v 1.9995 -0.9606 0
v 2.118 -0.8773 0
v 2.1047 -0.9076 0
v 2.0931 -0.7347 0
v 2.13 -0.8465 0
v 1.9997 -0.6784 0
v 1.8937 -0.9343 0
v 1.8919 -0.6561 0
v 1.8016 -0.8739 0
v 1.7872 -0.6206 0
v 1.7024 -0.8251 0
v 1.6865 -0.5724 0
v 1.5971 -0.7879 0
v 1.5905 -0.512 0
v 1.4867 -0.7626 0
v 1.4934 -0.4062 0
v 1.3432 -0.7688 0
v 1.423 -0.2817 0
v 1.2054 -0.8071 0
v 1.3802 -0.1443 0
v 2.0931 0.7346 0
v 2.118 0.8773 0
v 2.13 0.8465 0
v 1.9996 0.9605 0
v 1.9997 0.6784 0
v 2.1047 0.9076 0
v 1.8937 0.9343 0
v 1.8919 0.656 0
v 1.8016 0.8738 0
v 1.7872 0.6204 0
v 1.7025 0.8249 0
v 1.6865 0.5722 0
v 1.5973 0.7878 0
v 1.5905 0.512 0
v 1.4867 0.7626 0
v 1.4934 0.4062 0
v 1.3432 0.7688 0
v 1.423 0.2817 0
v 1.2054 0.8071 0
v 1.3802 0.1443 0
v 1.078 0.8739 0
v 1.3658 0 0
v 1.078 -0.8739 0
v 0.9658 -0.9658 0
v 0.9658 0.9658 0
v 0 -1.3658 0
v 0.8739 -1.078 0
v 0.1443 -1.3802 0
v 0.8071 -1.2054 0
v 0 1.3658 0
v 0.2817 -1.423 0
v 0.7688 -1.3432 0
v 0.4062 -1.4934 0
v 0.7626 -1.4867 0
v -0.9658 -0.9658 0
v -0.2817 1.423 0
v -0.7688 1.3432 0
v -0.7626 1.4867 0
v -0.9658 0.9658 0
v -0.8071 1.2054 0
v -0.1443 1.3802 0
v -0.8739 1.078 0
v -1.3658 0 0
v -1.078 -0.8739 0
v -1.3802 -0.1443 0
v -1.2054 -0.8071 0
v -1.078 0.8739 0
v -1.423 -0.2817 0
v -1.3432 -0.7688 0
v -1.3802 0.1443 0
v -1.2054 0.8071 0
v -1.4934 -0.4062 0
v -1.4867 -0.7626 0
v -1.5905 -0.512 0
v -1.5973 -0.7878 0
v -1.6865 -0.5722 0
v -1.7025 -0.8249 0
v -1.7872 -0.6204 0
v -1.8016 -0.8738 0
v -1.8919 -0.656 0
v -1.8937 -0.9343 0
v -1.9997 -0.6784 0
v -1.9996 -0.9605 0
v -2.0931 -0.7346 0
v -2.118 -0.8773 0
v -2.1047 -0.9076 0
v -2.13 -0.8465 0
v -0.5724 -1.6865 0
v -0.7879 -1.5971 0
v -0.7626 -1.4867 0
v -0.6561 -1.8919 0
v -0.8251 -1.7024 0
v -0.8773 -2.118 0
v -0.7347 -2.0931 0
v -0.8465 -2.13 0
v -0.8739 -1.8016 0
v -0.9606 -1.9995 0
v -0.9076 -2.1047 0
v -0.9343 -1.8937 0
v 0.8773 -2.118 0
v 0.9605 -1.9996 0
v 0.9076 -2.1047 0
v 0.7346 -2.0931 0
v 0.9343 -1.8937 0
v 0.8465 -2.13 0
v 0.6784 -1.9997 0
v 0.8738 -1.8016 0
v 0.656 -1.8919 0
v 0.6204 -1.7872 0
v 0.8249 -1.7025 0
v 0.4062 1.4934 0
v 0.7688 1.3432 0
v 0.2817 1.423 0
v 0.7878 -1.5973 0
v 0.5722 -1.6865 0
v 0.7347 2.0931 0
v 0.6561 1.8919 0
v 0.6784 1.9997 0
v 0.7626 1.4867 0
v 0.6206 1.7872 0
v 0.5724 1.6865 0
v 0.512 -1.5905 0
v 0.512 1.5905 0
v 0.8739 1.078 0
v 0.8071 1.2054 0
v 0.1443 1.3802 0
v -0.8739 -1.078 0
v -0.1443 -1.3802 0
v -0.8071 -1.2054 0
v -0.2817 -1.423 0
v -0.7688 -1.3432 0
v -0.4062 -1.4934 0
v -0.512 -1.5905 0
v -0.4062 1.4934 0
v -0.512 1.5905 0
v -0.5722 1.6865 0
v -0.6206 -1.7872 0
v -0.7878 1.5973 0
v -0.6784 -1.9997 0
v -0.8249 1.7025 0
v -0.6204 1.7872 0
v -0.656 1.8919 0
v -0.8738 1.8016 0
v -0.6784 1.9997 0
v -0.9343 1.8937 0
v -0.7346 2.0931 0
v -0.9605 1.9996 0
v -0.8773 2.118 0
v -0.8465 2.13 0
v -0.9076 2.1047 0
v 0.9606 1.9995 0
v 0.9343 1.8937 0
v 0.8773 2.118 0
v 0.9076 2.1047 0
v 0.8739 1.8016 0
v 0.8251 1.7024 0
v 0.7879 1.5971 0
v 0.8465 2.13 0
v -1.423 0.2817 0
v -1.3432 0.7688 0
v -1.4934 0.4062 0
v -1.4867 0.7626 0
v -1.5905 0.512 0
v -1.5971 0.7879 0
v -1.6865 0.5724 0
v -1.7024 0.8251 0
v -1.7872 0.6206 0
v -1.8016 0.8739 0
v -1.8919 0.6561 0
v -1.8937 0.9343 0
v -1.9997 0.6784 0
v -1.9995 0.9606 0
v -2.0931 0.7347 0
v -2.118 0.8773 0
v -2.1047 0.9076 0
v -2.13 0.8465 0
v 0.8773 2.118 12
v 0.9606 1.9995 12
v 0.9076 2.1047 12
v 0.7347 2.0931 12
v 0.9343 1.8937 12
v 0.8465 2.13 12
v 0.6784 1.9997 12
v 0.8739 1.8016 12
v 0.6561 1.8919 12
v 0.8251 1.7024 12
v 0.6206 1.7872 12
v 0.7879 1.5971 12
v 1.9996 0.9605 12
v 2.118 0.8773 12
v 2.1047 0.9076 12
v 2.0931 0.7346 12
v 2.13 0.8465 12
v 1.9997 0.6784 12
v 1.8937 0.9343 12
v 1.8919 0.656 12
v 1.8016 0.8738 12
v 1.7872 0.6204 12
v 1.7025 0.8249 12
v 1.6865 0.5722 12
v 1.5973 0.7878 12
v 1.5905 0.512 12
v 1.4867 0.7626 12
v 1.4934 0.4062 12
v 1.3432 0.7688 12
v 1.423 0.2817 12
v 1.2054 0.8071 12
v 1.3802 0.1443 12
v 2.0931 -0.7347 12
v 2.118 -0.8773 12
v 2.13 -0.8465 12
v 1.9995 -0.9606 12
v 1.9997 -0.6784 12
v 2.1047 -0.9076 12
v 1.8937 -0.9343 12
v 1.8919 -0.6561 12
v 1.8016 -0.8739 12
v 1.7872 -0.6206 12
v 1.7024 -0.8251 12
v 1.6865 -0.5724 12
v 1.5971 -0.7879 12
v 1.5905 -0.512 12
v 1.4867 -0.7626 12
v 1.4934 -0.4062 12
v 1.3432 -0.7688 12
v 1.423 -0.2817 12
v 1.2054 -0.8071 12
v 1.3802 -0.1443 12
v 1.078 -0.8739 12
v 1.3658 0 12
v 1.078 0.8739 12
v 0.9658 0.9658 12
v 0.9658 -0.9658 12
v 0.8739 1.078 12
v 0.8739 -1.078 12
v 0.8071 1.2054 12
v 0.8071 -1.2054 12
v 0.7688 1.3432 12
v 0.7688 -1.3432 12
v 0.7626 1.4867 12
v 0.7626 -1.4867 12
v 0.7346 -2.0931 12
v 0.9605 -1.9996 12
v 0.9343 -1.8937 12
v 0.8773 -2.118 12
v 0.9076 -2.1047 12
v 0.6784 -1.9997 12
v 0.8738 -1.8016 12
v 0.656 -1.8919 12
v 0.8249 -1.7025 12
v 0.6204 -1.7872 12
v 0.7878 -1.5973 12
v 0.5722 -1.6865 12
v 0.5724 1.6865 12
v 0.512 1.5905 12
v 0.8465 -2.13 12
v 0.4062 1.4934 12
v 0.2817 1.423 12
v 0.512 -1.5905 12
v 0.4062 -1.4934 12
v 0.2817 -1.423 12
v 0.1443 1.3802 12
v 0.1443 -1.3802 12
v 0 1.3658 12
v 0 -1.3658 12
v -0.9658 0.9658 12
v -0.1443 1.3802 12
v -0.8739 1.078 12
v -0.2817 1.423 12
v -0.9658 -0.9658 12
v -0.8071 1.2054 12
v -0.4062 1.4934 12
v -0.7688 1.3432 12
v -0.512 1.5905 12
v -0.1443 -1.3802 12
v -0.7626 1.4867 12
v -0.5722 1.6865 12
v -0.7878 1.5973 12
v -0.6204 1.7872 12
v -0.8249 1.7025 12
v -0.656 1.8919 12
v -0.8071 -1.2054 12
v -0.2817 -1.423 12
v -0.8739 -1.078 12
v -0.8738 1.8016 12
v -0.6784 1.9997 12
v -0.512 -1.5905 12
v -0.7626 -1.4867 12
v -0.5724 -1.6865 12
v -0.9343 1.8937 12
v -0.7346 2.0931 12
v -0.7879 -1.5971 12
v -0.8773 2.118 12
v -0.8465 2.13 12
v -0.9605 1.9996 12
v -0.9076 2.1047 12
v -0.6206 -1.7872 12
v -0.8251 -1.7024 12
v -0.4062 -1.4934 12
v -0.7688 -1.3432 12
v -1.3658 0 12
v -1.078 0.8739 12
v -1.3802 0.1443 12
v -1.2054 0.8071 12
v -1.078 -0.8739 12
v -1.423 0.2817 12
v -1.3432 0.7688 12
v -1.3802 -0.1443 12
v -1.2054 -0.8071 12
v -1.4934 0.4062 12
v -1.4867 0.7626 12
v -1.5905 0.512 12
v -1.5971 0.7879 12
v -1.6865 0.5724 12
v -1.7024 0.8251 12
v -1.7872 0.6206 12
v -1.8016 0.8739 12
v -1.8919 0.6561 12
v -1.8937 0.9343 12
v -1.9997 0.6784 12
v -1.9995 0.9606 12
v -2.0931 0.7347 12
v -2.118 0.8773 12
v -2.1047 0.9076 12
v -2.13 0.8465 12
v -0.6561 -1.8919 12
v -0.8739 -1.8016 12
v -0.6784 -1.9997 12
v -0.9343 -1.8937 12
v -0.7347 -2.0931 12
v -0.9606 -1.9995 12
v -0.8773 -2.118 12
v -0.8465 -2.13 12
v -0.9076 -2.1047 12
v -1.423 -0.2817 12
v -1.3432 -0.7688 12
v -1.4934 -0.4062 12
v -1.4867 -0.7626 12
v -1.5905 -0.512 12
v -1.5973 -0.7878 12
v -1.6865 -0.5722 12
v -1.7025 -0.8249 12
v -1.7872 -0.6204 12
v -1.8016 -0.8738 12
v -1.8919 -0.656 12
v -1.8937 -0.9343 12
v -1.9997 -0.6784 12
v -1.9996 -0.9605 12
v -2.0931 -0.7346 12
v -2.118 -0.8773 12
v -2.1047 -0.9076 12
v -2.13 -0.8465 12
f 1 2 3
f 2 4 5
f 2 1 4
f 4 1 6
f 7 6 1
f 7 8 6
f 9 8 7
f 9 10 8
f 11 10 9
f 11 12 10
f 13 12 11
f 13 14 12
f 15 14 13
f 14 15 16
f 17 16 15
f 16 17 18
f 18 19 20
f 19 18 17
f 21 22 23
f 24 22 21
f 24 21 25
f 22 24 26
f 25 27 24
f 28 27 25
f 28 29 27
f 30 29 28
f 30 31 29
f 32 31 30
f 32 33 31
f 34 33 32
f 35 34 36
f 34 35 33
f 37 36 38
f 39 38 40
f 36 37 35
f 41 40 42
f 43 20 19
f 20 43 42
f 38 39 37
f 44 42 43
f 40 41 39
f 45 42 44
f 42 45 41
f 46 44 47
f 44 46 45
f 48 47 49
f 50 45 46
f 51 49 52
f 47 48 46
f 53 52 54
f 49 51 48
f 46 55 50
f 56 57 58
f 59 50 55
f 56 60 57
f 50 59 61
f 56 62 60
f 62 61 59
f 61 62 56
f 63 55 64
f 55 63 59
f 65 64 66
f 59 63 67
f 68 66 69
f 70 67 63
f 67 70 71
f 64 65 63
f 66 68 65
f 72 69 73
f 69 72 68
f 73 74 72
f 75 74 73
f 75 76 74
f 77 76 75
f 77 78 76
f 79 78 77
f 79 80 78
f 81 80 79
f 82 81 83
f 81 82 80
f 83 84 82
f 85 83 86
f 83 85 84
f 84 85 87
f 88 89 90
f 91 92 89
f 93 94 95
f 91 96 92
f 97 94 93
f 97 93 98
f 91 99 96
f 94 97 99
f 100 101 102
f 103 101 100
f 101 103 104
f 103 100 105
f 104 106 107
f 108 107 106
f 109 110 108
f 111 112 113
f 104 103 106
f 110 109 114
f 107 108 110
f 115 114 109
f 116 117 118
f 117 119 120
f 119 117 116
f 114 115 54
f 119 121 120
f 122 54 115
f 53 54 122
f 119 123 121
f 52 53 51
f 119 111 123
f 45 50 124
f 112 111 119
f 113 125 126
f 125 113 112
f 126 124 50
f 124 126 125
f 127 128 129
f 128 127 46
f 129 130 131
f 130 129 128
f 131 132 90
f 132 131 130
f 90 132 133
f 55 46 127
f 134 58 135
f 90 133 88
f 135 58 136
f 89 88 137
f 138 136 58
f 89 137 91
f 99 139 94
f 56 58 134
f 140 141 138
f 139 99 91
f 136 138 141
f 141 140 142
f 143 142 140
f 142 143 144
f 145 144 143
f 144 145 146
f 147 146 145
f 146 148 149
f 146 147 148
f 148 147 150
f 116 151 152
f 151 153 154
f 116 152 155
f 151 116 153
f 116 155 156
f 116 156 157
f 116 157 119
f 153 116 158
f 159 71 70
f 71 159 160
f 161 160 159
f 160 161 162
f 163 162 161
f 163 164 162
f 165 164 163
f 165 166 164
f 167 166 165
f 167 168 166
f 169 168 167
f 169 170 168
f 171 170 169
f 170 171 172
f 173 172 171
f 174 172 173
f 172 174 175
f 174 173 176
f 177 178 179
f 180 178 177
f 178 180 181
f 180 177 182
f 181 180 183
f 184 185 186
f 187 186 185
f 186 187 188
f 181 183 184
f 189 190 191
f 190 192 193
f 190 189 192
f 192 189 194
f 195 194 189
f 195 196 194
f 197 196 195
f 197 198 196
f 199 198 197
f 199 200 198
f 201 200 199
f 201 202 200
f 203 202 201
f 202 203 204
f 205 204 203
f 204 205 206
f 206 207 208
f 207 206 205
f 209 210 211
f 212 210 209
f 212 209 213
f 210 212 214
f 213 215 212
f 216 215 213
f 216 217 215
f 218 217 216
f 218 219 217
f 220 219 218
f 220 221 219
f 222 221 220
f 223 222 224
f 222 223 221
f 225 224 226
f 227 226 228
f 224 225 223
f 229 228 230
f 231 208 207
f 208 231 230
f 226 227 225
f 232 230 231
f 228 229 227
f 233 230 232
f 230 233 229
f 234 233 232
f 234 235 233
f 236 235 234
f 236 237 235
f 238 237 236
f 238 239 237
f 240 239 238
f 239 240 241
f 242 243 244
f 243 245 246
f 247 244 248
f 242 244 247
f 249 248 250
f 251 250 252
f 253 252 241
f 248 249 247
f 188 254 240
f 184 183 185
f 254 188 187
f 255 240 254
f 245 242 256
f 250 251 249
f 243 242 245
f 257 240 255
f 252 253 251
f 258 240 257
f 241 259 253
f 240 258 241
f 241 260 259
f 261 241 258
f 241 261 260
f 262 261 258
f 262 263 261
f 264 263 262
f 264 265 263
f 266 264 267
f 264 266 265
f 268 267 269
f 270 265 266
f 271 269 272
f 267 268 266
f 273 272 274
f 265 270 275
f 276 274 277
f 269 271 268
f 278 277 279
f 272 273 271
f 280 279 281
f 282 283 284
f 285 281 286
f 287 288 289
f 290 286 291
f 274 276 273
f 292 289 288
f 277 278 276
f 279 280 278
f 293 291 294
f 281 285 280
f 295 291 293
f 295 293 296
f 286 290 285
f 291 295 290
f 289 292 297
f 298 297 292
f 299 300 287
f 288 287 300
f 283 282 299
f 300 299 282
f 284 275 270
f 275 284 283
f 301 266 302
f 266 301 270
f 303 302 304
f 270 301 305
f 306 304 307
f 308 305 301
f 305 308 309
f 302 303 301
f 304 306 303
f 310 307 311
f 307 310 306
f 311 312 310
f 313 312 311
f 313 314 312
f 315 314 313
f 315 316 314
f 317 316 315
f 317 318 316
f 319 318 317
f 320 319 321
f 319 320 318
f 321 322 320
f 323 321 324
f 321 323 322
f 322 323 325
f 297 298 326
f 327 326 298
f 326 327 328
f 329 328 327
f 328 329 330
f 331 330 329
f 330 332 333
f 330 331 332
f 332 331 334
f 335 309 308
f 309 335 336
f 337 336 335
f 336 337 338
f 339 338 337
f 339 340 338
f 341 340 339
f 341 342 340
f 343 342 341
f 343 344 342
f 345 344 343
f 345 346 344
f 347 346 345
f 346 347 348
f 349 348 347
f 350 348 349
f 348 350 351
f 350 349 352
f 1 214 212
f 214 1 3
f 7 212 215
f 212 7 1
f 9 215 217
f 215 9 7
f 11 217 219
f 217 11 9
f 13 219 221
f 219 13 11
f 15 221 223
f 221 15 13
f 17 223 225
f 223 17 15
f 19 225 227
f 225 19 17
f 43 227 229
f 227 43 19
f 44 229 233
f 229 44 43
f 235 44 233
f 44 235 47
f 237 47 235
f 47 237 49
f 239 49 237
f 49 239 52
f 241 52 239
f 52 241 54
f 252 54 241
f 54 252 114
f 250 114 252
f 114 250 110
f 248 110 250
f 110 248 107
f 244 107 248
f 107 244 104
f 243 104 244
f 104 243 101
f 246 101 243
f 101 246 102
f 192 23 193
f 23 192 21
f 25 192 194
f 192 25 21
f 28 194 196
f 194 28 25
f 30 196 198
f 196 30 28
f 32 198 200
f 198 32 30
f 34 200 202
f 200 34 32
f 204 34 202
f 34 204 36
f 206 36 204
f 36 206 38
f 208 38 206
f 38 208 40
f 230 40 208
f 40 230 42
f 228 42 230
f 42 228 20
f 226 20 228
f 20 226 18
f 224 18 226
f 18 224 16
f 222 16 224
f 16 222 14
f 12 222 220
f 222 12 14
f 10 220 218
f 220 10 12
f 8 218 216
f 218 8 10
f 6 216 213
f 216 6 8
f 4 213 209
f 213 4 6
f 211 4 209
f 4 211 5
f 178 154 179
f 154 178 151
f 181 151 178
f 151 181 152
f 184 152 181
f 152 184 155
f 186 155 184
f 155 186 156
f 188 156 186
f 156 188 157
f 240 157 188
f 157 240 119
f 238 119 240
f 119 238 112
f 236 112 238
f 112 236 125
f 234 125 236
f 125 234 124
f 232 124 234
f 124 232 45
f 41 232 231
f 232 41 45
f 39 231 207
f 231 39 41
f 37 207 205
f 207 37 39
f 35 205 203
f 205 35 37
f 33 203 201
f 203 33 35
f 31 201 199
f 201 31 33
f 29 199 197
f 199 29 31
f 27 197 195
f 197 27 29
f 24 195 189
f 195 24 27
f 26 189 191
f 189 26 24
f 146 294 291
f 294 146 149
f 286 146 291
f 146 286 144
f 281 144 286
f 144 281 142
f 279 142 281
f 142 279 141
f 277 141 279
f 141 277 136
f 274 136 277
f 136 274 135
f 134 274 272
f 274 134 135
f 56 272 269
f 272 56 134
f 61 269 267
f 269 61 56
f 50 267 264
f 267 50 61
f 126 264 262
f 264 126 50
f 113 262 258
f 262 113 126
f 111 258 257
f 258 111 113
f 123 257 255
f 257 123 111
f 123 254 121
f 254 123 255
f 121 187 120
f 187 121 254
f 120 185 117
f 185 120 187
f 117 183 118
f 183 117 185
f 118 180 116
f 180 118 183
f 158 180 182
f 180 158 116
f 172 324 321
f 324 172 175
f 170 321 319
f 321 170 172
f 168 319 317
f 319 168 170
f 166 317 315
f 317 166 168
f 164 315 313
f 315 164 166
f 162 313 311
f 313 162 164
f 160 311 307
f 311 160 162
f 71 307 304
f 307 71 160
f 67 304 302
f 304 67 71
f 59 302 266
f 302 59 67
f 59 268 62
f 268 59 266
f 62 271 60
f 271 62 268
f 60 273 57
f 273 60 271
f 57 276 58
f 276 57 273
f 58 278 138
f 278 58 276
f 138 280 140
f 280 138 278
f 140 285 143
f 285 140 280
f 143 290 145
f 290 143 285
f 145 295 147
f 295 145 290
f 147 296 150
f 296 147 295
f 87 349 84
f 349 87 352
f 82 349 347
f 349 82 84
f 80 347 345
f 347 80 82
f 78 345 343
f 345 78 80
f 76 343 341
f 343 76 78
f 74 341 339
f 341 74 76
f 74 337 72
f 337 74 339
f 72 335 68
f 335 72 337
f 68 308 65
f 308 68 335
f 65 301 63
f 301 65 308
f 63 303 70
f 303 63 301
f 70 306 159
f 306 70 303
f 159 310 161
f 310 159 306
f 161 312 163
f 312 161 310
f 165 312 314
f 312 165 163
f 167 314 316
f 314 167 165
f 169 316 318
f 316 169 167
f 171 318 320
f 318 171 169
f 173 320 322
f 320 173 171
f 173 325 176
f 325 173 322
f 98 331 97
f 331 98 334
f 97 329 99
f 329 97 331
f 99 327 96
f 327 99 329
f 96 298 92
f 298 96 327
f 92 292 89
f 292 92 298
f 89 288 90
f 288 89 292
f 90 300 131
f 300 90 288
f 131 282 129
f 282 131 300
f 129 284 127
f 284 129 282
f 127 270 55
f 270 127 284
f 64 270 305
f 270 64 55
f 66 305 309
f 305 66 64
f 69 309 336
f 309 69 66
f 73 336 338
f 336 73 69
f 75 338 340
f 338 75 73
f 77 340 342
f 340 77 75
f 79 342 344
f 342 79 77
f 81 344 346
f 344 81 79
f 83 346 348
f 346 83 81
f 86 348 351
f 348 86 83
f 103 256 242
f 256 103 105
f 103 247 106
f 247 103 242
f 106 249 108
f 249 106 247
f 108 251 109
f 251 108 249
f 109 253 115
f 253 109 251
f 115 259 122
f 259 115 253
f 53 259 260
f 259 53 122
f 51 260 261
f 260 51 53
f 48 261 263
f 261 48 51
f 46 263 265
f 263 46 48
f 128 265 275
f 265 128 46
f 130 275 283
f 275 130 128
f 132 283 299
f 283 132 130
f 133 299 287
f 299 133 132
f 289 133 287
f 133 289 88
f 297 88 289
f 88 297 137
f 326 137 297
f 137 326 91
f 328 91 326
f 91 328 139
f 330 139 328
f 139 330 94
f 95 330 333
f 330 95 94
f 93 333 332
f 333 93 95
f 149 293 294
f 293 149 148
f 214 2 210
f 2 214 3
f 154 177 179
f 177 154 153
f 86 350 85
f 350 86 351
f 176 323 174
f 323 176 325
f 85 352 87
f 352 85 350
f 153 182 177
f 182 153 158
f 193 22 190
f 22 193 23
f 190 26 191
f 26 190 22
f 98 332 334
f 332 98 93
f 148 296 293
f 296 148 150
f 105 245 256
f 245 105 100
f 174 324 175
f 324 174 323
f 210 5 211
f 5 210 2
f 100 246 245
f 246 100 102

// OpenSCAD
// Parametric Pulley with multiple belt profiles
// by droftarts January 2012
// updated and changed by Oscar January 2018 (https://www.thingiverse.com/0scar/about)

// Based on pulleys by:
// http://www.thingiverse.com/thing:11256 by me!
// https://github.com/prusajr/PrusaMendel by Josef Prusa
// http://www.thingiverse.com/thing:3104 by GilesBathgate
// http://www.thingiverse.com/thing:2079 by nophead

// dxf tooth data from http://oem.cadregister.com/asp/PPOW_Entry.asp?company=915217&elementID=07807803/METRIC/URETH/WV0025/F
// pulley diameter checked and modelled from data at http://www.sdp-si.com/D265/HTML/D265T016.html

/**
 * @name Pulley
 * @category Printed
 * @using 1 x m3 nut, normal or nyloc
 * @using 1 x m3x10 set screw or 1 x m3x8 grub screw
 */

// ------------------------
// Idler profile parameters
// ------------------------
//number_of_teeth_test = 60; // [10:100]
profile = 12; // [1:MXL, 2:40DP, 3:XL, 4:H, 5:T2.5, 6:T5, 7:T10, 8:AT5, 9:HTD_3mm, 10:HTD_5mm, 11:HTD_8mm, 12:GT2_2mm, 13:GT2_3mm, 14:GT2_5mm]
motor_shaft_diameter = 0; // (in mm)
//toothed_part_length = 10; // [3:30] (in mm)
base_height = 0; // [0:30] (in mm, 6 is typical)
base_diameter = 0;   // [10:50] (in mm)

// ---------------------------
// Idler & retainer parameters
// ---------------------------
belt_retainer = 0; // [0:No, 1:Yes]
retainer_height_p = 1.0; // [0.5:Tiny (0.5mm), 1:Small (1mm), 1.5:Normal (1.5mm), 2:Big (2mm), 3:Bigger (3mm), 4:Hudge (5mm)]
belt_idler = 0; // [0:No, 1:Yes]
// Height of idler flange over pulley. Set to same as base height if you want an idler but no pulley.
idler_height_p = 1.0; // [0.5:Tiny (0.5mm), 1:Small (1mm), 1.5:Normal (1.5mm), 2:Big (2mm), 3:Bigger (3mm), 4:Hudge (5mm)]

// ---------------
// Shaft fastening
// ---------------
screws_disposition = 0; // [0:None, 1:1 screw, 2:2 screws at 90deg, 3:3 screws at 120deg, 4:4 screws at 90deg]
nut_shape = 1; // [1:Hexagonal, 0:Square]
screw_profile = 4; // [0:M1, 1:M1.6, 2:M2, 3:M2.5, 4:M3, 5:M4, 6:M5, 7:M6]

// Distance between inner face of nut and shaft - can be negative - (in mm).
nut_shaft_distance = 1.2;

// Bolt head shape (0 is inactive) subtracts a bolt head sized hexagon for hexagon bolts
idler_bolt_option = 0; // [0:none, 1:M3, 2:M4, 3:M5, 4:M6, 5:M8, 6:M10, 7:M12, 8:custom] for custom: make changes below!

// Optional metal flange attachment (0 is inactive)
flange_option = 0;
flange_screw_profile = 5; // [0:M1, 1:M1.6, 2:M2, 3:M2.5, 4:M3, 5:M4, 6:M5, 7:M6]
flange_screws_disposition = 4; // [0:None, 1:1 screw, 2:2 screws at 180deg, 3:3 screws at 120deg, 4:4 screws at 90deg]
flange_screwoffset_radius = 26/2;
flange_diam = 32; // Set to zero to disable the flange to be sunk in the idler
flange_thickness = 3; // Set to zero to disable the flange to be sunk in the idler
flange_use_tap = 1; // Diameter is smaller when used for tapping, 0 to larger hole for easy fit


// --------------------------------------------------
// ADVANCED parameters for scaling tooth for good fit
// --------------------------------------------------
// To improve fit of belt to pulley, set the following constant.
// Decrease or increase by 0.1mm at a time. We are modelling the
// *BELT* tooth here, not the tooth on the pulley. Increasing the
// number will *decrease* the pulley tooth size. Increasing the
// tooth width will also scale proportionately the tooth depth,
// to maintain the shape of the tooth, and increase how far into
// the pulley the tooth is indented. Can be negative too!
additional_tooth_width = 0.2; //mm
// If you need more tooth depth than this provides, adjust the
// following constant. However, this will cause the shape of the
// tooth to change.
additional_tooth_depth = 0; //mm

// ------------------------------------
// Calculated parameters (do not alter)
// ------------------------------------
idler_height = (belt_idler==0 ? 0 : idler_height_p);
retainer_height = (belt_retainer==0 ? 0 : retainer_height_p);
//echo (str("Idler height\t= ",idler_height," mm"));
//echo (str("Retainer height\t= ",retainer_height," mm"));
no_of_nuts = screws_disposition;
nut_angle = no_of_nuts != 3 ? 90 : 120;
motor_shaft = motor_shaft_diameter + 0.2;
screw_diameters = [1, 1.6, 2, 2.5, 3, 4, 5, 6];
nut_widths = [2.5, 3.2, 4, 5, 5.5, 7, 8, 10];
nut_depths = [1, 1.3, 1.6, 2, 2.4, 3.2, 4.7, 5.2];
// bolthead size circ.[ none,    M3,    M4,   M5,    M6,    M8,   M10,   M12, custom]
bolt_head_diameters = [0.000, 6.010, 7.660, 8.79, 11.05, 14.38, 17.77, 20.03,  15.8]; // circle diameter, not width across flats!
bolt_head_heights =   [0.000, 2.125, 2.925, 3.65,  4.15,  5.45,  6.58,  7.68,   5.5];
screw_diameter = screw_diameters[screw_profile] + 0.2;
nut_width = nut_widths[screw_profile] + 0.2;
nut_depth = nut_depths[screw_profile] + 0.3;
bolt_head_diam = bolt_head_diameters[idler_bolt_option] + 0.2; // + 0.1-2 for tight fit
bolt_head_height = bolt_head_heights[idler_bolt_option] + 0.2;
screw_hole_sf = flange_use_tap == 1 ? 0.9 : 1.1; // 0.9 is the recommended value for taps of fine thread, 0.85 for coarse threads
flange_screw_diameter = screw_diameters[flange_screw_profile] * screw_hole_sf; 
flange_no_of_screws = flange_screws_disposition;
flange_screw_angle = flange_no_of_screws != 3 ? (flange_no_of_screws == 2 ? 180 : 90) : 120;

// --------------------
// Calculated constants
// --------------------
nut_elevation = base_height/2;
metric_nut_width_across_points = 2*((nut_width/2)/cos(30)); // This is needed for the nut trap
// The following set the pulley diameter for a given number of teeth
//MXL_pulley_dia = tooth_spacing (2.032,0.254, number_of_teeth);
//40DP_pulley_dia = tooth_spacing (2.07264,0.1778, number_of_teeth);
//XL_pulley_dia = tooth_spacing (5.08,0.254, number_of_teeth);
//H_pulley_dia = tooth_spacing (9.525,0.381, number_of_teeth);
//T2_5_pulley_dia = tooth_spaceing_curvefit (0.7467,0.796,1.026, number_of_teeth);
//T5_pulley_dia = tooth_spaceing_curvefit (0.6523,1.591,1.064, number_of_teeth);
//T10_pulley_dia = tooth_spacing (10,0.93, number_of_teeth);
//AT5_pulley_dia = tooth_spaceing_curvefit (0.6523,1.591,1.064, number_of_teeth);
//HTD_3mm_pulley_dia = tooth_spacing (3,0.381, number_of_teeth);
//HTD_5mm_pulley_dia = tooth_spacing (5,0.5715, number_of_teeth);
//HTD_8mm_pulley_dia = tooth_spacing (8,0.6858, number_of_teeth);
//GT2_2mm_pulley_dia = tooth_spacing (2,0.254, number_of_teeth);

//GT2_3mm_pulley_dia = tooth_spacing (3,0.381, number_of_teeth);
//GT2_5mm_pulley_dia = tooth_spacing (5,0.5715, number_of_teeth);
// The following calls the pulley creation part, and passes the pulley diameter and tooth width to that module
//if ( profile == 1 ) {pulley("MXL" , MXL_pulley_dia , 0.508 , 1.321 ); }
//if ( profile == 2 ) {pulley("40 D.P." , 40DP_pulley_dia , 0.457 , 1.226 ); }
//if ( profile == 3 ) {pulley("XL" , XL_pulley_dia , 1.27, 3.051 ); }
//if ( profile == 4 ) {pulley("H" , H_pulley_dia ,1.905 , 5.359 ); }
//if ( profile == 5 ) {pulley("T2.5" , T2_5_pulley_dia , 0.7 , 1.678 ); }
//if ( profile == 6 ) {pulley("T5" , T5_pulley_dia , 1.19 , 3.264 ); }
//if ( profile == 7 ) {pulley("T10" , T10_pulley_dia , 2.5 , 6.13 ); }
//if ( profile == 8 ) {pulley("AT5" , AT5_pulley_dia , 1.19 , 4.268 ); }
//if ( profile == 9 ) {pulley("HTD 3mm" , HTD_3mm_pulley_dia , 1.289 , 2.27 ); }
//if ( profile == 10 ){pulley("HTD 5mm" , HTD_5mm_pulley_dia , 2.199 , 3.781 ); }
//if ( profile == 11 ){pulley("HTD 8mm" , HTD_8mm_pulley_dia , 3.607 , 6.603 ); }
// oldif ( profile == 12 ){pulley("GT2 2mm" , GT2_2mm_pulley_dia , 0.764 , 1.494, number_of_teeth_test ); }


#pulley_gt2(8,12);

module pulley_gt2(number_of_teeth,depth,tooth_width_clearance=0.2,tooth_depth_clearance=0){
  assert(number_of_teeth >= 8 && floor(number_of_teeth) == number_of_teeth);
  assert(depth > 0);
  // Keep the inherited GT2 polygon. Callers supply bores; fit is per instance.
  pulley("GT2 2mm",tooth_spacing(2,0.254,number_of_teeth),0.764,1.494,number_of_teeth,depth,
    additional_tooth_width=tooth_width_clearance,
    additional_tooth_depth=tooth_depth_clearance,motor_shaft=0);
}
//if ( profile == 13 ){pulley("GT2 3mm" , GT2_3mm_pulley_dia , 1.169 , 2.31 ); }
//if ( profile == 14 ){pulley("GT2 5mm" , GT2_5mm_pulley_dia , 1.969 , 3.952 ); }

// ---------
// Functions
// ---------
function tooth_spaceing_curvefit (b,c,d, number_of_teeth)
  = ((c * pow(number_of_teeth,d)) / (b + pow(number_of_teeth,d))) * number_of_teeth ;

function tooth_spacing(tooth_pitch,pitch_line_offset, number_of_teeth)
  = (2*((number_of_teeth*tooth_pitch)/(3.14159265*2)-pitch_line_offset)) ;

// ================================================================================
// Main Module
// ================================================================================
module pulley( belt_type , pulley_OD , tooth_depth , tooth_width, number_of_teeth,toothed_part_length, additional_tooth_width=0.2, additional_tooth_depth=0, motor_shaft=0.2 ){
  echo (str("Belt type = ",belt_type,"; Number of teeth = ",number_of_teeth,"; Pulley Outside Diameter = ",pulley_OD,"mm "));
  tooth_distance_from_centre = sqrt( pow(pulley_OD/2,2) - pow((tooth_width+additional_tooth_width)/2,2));
  tooth_width_scale = (tooth_width + additional_tooth_width ) / tooth_width;
  tooth_depth_scale = ((tooth_depth + additional_tooth_depth ) / tooth_depth) ;

  difference(){   
    translate([0,0,idler_height]){
      union(){
        //base
        if (( base_height < 2 ) && (no_of_nuts > 0)){ 
          if (base_height != 0){
            echo ("CAN'T DRAW PULLEY BASE, HEIGHT LESS THAN 2!!!"); 
          }
        } else {
          translate([0,0,-idler_height]){
            cylinder(d=base_diameter, h=base_height, $fn=base_diameter*20, center=false);
          }
        }

        difference(){
          //shaft - diameter is outside diameter of pulley
          translate([0,0,base_height]){ 
            rotate ([0,0,360/(number_of_teeth*4)]){
              //cylinder(r=pulley_OD/2,h=toothed_part_length, $fn=number_of_teeth*4);
              cylinder(r=pulley_OD/2,h=toothed_part_length, $fn=number_of_teeth*20);
            }
          }
          //teeth - cut out of shaft
          for(i=[1:number_of_teeth]){
            rotate([0,0,i*(360/number_of_teeth)]){
              translate([0,-tooth_distance_from_centre,base_height]){
                scale ([ tooth_width_scale , tooth_depth_scale , 1 ]){
                if ( profile == 1  ) { MXL();}
                if ( profile == 2  ) { profile_40DP();}
                if ( profile == 3  ) { XL();}
                if ( profile == 4  ) { H();}
                if ( profile == 5  ) { T2_5();}
                if ( profile == 6  ) { T5();}
                if ( profile == 7  ) { T10();}
                if ( profile == 8  ) { AT5();}
                if ( profile == 9  ) { HTD_3mm();}
                if ( profile == 10 ) { HTD_5mm();}
                if ( profile == 11 ) { HTD_8mm();}
                if ( profile == 12 ) { GT2_2mm(toothed_part_length);}
                if ( profile == 13 ) { GT2_3mm();}
                if ( profile == 14 ) { GT2_5mm();}
                }
              }
            }
          }
        } // end of difference in union
          
        // Top belt retainer / idler
        if ( belt_retainer == 1 ){
          translate ([0,0, base_height + toothed_part_length ]){
            cylinder(r1 = pulley_OD/2, r2 = pulley_OD/2 + 2*retainer_height/3, h = 2*retainer_height/3, $fn = pulley_OD*20, center = false);
            translate([0,0,2*retainer_height/3]){
              cylinder(r = pulley_OD/2 + 2*retainer_height/3, h = retainer_height/3, $fn = pulley_OD*20, center = false);
            }
          }
        }
        // Bottom belt retainer
        if ( belt_idler == 1 ){
          translate ([0,0, base_height - idler_height ]){
            cylinder(r = pulley_OD/2 + 2*retainer_height/3, h = retainer_height/3, $fn = pulley_OD*20, center = false);
            translate([0,0,retainer_height/3]){
              cylinder(r2 = pulley_OD/2, r1 = pulley_OD/2 + 2*retainer_height/3, h = 2*retainer_height/3, $fn = pulley_OD*20, center = false);
            }
          }
        }
      } // end of union
    } // end of translation before union
   
    //hole for motor shaft
    if (motor_shaft > 0) translate([0,0,-1]){
      cylinder(r=motor_shaft/2,h=base_height + idler_height + toothed_part_length + retainer_height + 2,$fn=motor_shaft*20);
    }
          
    //captive nut and grub screw holes
    if ( base_height < nut_width ){
      if (base_height != 0){
        echo ("CAN'T DRAW CAPTIVE NUTS, HEIGHT LESS THAN NUT DIAMETER!!!");
      }
    } else {
      if ( (base_diameter - motor_shaft)/2 < nut_depth + 3 ) { 
        echo ("CAN'T DRAW CAPTIVE NUTS, DIAMETER TOO SMALL FOR NUT DEPTH!!!");
      } else {
        // Iterate over nuts amount
        if (no_of_nuts > 0){
          for(j=[1:no_of_nuts]){
            rotate([0,0,j*nut_angle]){
              translate([0,0,nut_elevation])rotate([90,0,0]){
                union(){
                  //entrance
                  translate([0,-base_height/4-0.5,motor_shaft/2+nut_depth/2+nut_shaft_distance]) cube([nut_width,base_height/2+1,nut_depth],center=true);
                  //nut
                  if ( nut_shape > 0 ){
                    // hex nut
                    translate([0,0.25,motor_shaft/2+nut_depth/2+nut_shaft_distance]) rotate([0,0,30]) cylinder(r=metric_nut_width_across_points/2,h=nut_depth,center=true,$fn=6);
                  } else {
                    // square nut
                    translate([0,0.25,motor_shaft/2+nut_depth/2+nut_shaft_distance]) cube([nut_width,nut_width,nut_depth],center=true);
                  }

                  //grub screw hole
                  //rotate([0,0,22.5])cylinder(r=screw_diameter/2,h=base_diameter/2+1,$fn=8);
                  rotate([0,0,22.5])cylinder(r=screw_diameter/2,h=base_diameter/2+1,$fn=60);
                }
              }
            }
          }
        }
      }
    }
    // Remove hexagon for hexagon bolt head shaft
    if (idler_bolt_option == 1){
      translate([0,0,base_height + toothed_part_length + retainer_height + idler_height - bolt_head_height]){
        cylinder(d=bolt_head_diam,h=bolt_head_height+0.1,$fn=6);
      }
    }
    // Remove flange and tap screw holes
    if (flange_option == 1){
      if (flange_thickness > 0) {
        translate([0,0,base_height + toothed_part_length + retainer_height + idler_height - flange_thickness]){
          cylinder(d=flange_diam+0.2,h=flange_thickness+0.1,$fn=180);
        }
      }
      // Iterate over screws amount
      if (flange_screws_disposition > 0){
        for(j=[1:flange_no_of_screws]){
          rotate([0,0,j*flange_screw_angle]){
            translate([-flange_screwoffset_radius,0,base_height-0.1]){
              cylinder(d=flange_screw_diameter,h=toothed_part_length + retainer_height + idler_height - flange_thickness+0.2,$fn=180);
            }
          }
        }
      }
    }
  }
}

// Tooth profile modules

module MXL()
  {
  linear_extrude(height=toothed_part_length+2) polygon([[-0.660421,-0.5],[-0.660421,0],[-0.621898,0.006033],[-0.587714,0.023037],[-0.560056,0.049424],[-0.541182,0.083609],[-0.417357,0.424392],[-0.398413,0.458752],[-0.370649,0.48514],[-0.336324,0.502074],[-0.297744,0.508035],[0.297744,0.508035],[0.336268,0.502074],[0.370452,0.48514],[0.39811,0.458752],[0.416983,0.424392],[0.540808,0.083609],[0.559752,0.049424],[0.587516,0.023037],[0.621841,0.006033],[0.660421,0],[0.660421,-0.5]]);
  }

module profile_40DP()
  {
  linear_extrude(height=toothed_part_length+2) polygon([[-0.612775,-0.5],[-0.612775,0],[-0.574719,0.010187],[-0.546453,0.0381],[-0.355953,0.3683],[-0.327604,0.405408],[-0.291086,0.433388],[-0.248548,0.451049],[-0.202142,0.4572],[0.202494,0.4572],[0.248653,0.451049],[0.291042,0.433388],[0.327609,0.405408],[0.356306,0.3683],[0.546806,0.0381],[0.574499,0.010187],[0.612775,0],[0.612775,-0.5]]);
  }

module XL()
  {
  linear_extrude(height=toothed_part_length+2) polygon([[-1.525411,-1],[-1.525411,0],[-1.41777,0.015495],[-1.320712,0.059664],[-1.239661,0.129034],[-1.180042,0.220133],[-0.793044,1.050219],[-0.733574,1.141021],[-0.652507,1.210425],[-0.555366,1.254759],[-0.447675,1.270353],[0.447675,1.270353],[0.555366,1.254759],[0.652507,1.210425],[0.733574,1.141021],[0.793044,1.050219],[1.180042,0.220133],[1.239711,0.129034],[1.320844,0.059664],[1.417919,0.015495],[1.525411,0],[1.525411,-1]]);
  }

module H()
  {
  linear_extrude(height=toothed_part_length+2) polygon([[-2.6797,-1],[-2.6797,0],[-2.600907,0.006138],[-2.525342,0.024024],[-2.45412,0.052881],[-2.388351,0.091909],[-2.329145,0.140328],[-2.277614,0.197358],[-2.234875,0.262205],[-2.202032,0.334091],[-1.75224,1.57093],[-1.719538,1.642815],[-1.676883,1.707663],[-1.62542,1.764693],[-1.566256,1.813112],[-1.500512,1.85214],[-1.4293,1.880997],[-1.353742,1.898883],[-1.274949,1.905021],[1.275281,1.905021],[1.354056,1.898883],[1.429576,1.880997],[1.500731,1.85214],[1.566411,1.813112],[1.625508,1.764693],[1.676919,1.707663],[1.719531,1.642815],[1.752233,1.57093],[2.20273,0.334091],[2.235433,0.262205],[2.278045,0.197358],[2.329455,0.140328],[2.388553,0.091909],[2.454233,0.052881],[2.525384,0.024024],[2.600904,0.006138],[2.6797,0],[2.6797,-1]]);
  }

module T2_5()
  {
  linear_extrude(height=toothed_part_length+2) polygon([[-0.839258,-0.5],[-0.839258,0],[-0.770246,0.021652],[-0.726369,0.079022],[-0.529167,0.620889],[-0.485025,0.67826],[-0.416278,0.699911],[0.416278,0.699911],[0.484849,0.67826],[0.528814,0.620889],[0.726369,0.079022],[0.770114,0.021652],[0.839258,0],[0.839258,-0.5]]);
  }

module T5()
  {
  linear_extrude(height=toothed_part_length+2) polygon([[-1.632126,-0.5],[-1.632126,0],[-1.568549,0.004939],[-1.507539,0.019367],[-1.450023,0.042686],[-1.396912,0.074224],[-1.349125,0.113379],[-1.307581,0.159508],[-1.273186,0.211991],[-1.246868,0.270192],[-1.009802,0.920362],[-0.983414,0.978433],[-0.949018,1.030788],[-0.907524,1.076798],[-0.859829,1.115847],[-0.80682,1.147314],[-0.749402,1.170562],[-0.688471,1.184956],[-0.624921,1.189895],[0.624971,1.189895],[0.688622,1.184956],[0.749607,1.170562],[0.807043,1.147314],[0.860055,1.115847],[0.907754,1.076798],[0.949269,1.030788],[0.9837,0.978433],[1.010193,0.920362],[1.246907,0.270192],[1.273295,0.211991],[1.307726,0.159508],[1.349276,0.113379],[1.397039,0.074224],[1.450111,0.042686],[1.507589,0.019367],[1.568563,0.004939],[1.632126,0],[1.632126,-0.5]]);
  }

module T10()
  {
  linear_extrude(height=toothed_part_length+2) polygon([[-3.06511,-1],[-3.06511,0],[-2.971998,0.007239],[-2.882718,0.028344],[-2.79859,0.062396],[-2.720931,0.108479],[-2.651061,0.165675],[-2.590298,0.233065],[-2.539962,0.309732],[-2.501371,0.394759],[-1.879071,2.105025],[-1.840363,2.190052],[-1.789939,2.266719],[-1.729114,2.334109],[-1.659202,2.391304],[-1.581518,2.437387],[-1.497376,2.47144],[-1.408092,2.492545],[-1.314979,2.499784],[1.314979,2.499784],[1.408091,2.492545],[1.497371,2.47144],[1.581499,2.437387],[1.659158,2.391304],[1.729028,2.334109],[1.789791,2.266719],[1.840127,2.190052],[1.878718,2.105025],[2.501018,0.394759],[2.539726,0.309732],[2.59015,0.233065],[2.650975,0.165675],[2.720887,0.108479],[2.798571,0.062396],[2.882713,0.028344],[2.971997,0.007239],[3.06511,0],[3.06511,-1]]);
  }

module AT5()
  {
  linear_extrude(height=toothed_part_length+2) polygon([[-2.134129,-0.75],[-2.134129,0],[-2.058023,0.005488],[-1.984595,0.021547],[-1.914806,0.047569],[-1.849614,0.082947],[-1.789978,0.127073],[-1.736857,0.179338],[-1.691211,0.239136],[-1.653999,0.305859],[-1.349199,0.959203],[-1.286933,1.054635],[-1.201914,1.127346],[-1.099961,1.173664],[-0.986896,1.18992],[0.986543,1.18992],[1.099614,1.173664],[1.201605,1.127346],[1.286729,1.054635],[1.349199,0.959203],[1.653646,0.305859],[1.690859,0.239136],[1.73651,0.179338],[1.789644,0.127073],[1.849305,0.082947],[1.914539,0.047569],[1.984392,0.021547],[2.057906,0.005488],[2.134129,0],[2.134129,-0.75]]);
  }

module HTD_3mm()
  {
  linear_extrude(height=toothed_part_length+2) polygon([[-1.135062,-0.5],[-1.135062,0],[-1.048323,0.015484],[-0.974284,0.058517],[-0.919162,0.123974],[-0.889176,0.206728],[-0.81721,0.579614],[-0.800806,0.653232],[-0.778384,0.72416],[-0.750244,0.792137],[-0.716685,0.856903],[-0.678005,0.918199],[-0.634505,0.975764],[-0.586483,1.029338],[-0.534238,1.078662],[-0.47807,1.123476],[-0.418278,1.16352],[-0.355162,1.198533],[-0.289019,1.228257],[-0.22015,1.25243],[-0.148854,1.270793],[-0.07543,1.283087],[-0.000176,1.28905],[0.075081,1.283145],[0.148515,1.270895],[0.219827,1.252561],[0.288716,1.228406],[0.354879,1.19869],[0.418018,1.163675],[0.477831,1.123623],[0.534017,1.078795],[0.586276,1.029452],[0.634307,0.975857],[0.677809,0.91827],[0.716481,0.856953],[0.750022,0.792167],[0.778133,0.724174],[0.800511,0.653236],[0.816857,0.579614],[0.888471,0.206728],[0.919014,0.123974],[0.974328,0.058517],[1.048362,0.015484],[1.135062,0],[1.135062,-0.5]]);
  }

module HTD_5mm()
  {
  linear_extrude(height=toothed_part_length+2) polygon([[-1.89036,-0.75],[-1.89036,0],[-1.741168,0.02669],[-1.61387,0.100806],[-1.518984,0.21342],[-1.467026,0.3556],[-1.427162,0.960967],[-1.398568,1.089602],[-1.359437,1.213531],[-1.310296,1.332296],[-1.251672,1.445441],[-1.184092,1.552509],[-1.108081,1.653042],[-1.024167,1.746585],[-0.932877,1.832681],[-0.834736,1.910872],[-0.730271,1.980701],[-0.62001,2.041713],[-0.504478,2.09345],[-0.384202,2.135455],[-0.259708,2.167271],[-0.131524,2.188443],[-0.000176,2.198511],[0.131296,2.188504],[0.259588,2.167387],[0.384174,2.135616],[0.504527,2.093648],[0.620123,2.04194],[0.730433,1.980949],[0.834934,1.911132],[0.933097,1.832945],[1.024398,1.746846],[1.108311,1.653291],[1.184308,1.552736],[1.251865,1.445639],[1.310455,1.332457],[1.359552,1.213647],[1.39863,1.089664],[1.427162,0.960967],[1.467026,0.3556],[1.518984,0.21342],[1.61387,0.100806],[1.741168,0.02669],[1.89036,0],[1.89036,-0.75]]);
  }

module HTD_8mm()
  {
  linear_extrude(height=toothed_part_length+2) polygon([[-3.301471,-1],[-3.301471,0],[-3.16611,0.012093],[-3.038062,0.047068],[-2.919646,0.10297],[-2.813182,0.177844],[-2.720989,0.269734],[-2.645387,0.376684],[-2.588694,0.496739],[-2.553229,0.627944],[-2.460801,1.470025],[-2.411413,1.691917],[-2.343887,1.905691],[-2.259126,2.110563],[-2.158035,2.30575],[-2.041518,2.490467],[-1.910478,2.66393],[-1.76582,2.825356],[-1.608446,2.973961],[-1.439261,3.10896],[-1.259169,3.22957],[-1.069074,3.335006],[-0.869878,3.424485],[-0.662487,3.497224],[-0.447804,3.552437],[-0.226732,3.589341],[-0.000176,3.607153],[0.226511,3.589461],[0.447712,3.552654],[0.66252,3.497516],[0.870027,3.424833],[1.069329,3.33539],[1.259517,3.229973],[1.439687,3.109367],[1.608931,2.974358],[1.766344,2.825731],[1.911018,2.664271],[2.042047,2.490765],[2.158526,2.305998],[2.259547,2.110755],[2.344204,1.905821],[2.411591,1.691983],[2.460801,1.470025],[2.553229,0.627944],[2.588592,0.496739],[2.645238,0.376684],[2.720834,0.269734],[2.81305,0.177844],[2.919553,0.10297],[3.038012,0.047068],[3.166095,0.012093],[3.301471,0],[3.301471,-1]]);
  }

module GT2_2mm(depth)
  {
  linear_extrude(depth) polygon([[0.747183,-0.5],[0.747183,0],[0.647876,0.037218],[0.598311,0.130528],[0.578556,0.238423],[0.547158,0.343077],[0.504649,0.443762],[0.451556,0.53975],[0.358229,0.636924],[0.2484,0.707276],[0.127259,0.750044],[0,0.76447],[-0.127259,0.750044],[-0.2484,0.707276],[-0.358229,0.636924],[-0.451556,0.53975],[-0.504797,0.443762],[-0.547291,0.343077],[-0.578605,0.238423],[-0.598311,0.130528],[-0.648009,0.037218],[-0.747183,0],[-0.747183,-0.5]]);
  }

module GT2_3mm()
  {
  linear_extrude(height=toothed_part_length+2) polygon([[-1.155171,-0.5],[-1.155171,0],[-1.065317,0.016448],[-0.989057,0.062001],[-0.93297,0.130969],[-0.90364,0.217664],[-0.863705,0.408181],[-0.800056,0.591388],[-0.713587,0.765004],[-0.60519,0.926747],[-0.469751,1.032548],[-0.320719,1.108119],[-0.162625,1.153462],[0,1.168577],[0.162625,1.153462],[0.320719,1.108119],[0.469751,1.032548],[0.60519,0.926747],[0.713587,0.765004],[0.800056,0.591388],[0.863705,0.408181],[0.90364,0.217664],[0.932921,0.130969],[0.988924,0.062001],[1.065168,0.016448],[1.155171,0],[1.155171,-0.5]]);
  }

module GT2_5mm()
  {
  linear_extrude(height=toothed_part_length+2) polygon([[-1.975908,-0.75],[-1.975908,0],[-1.797959,0.03212],[-1.646634,0.121224],[-1.534534,0.256431],[-1.474258,0.426861],[-1.446911,0.570808],[-1.411774,0.712722],[-1.368964,0.852287],[-1.318597,0.989189],[-1.260788,1.123115],[-1.195654,1.25375],[-1.12331,1.380781],[-1.043869,1.503892],[-0.935264,1.612278],[-0.817959,1.706414],[-0.693181,1.786237],[-0.562151,1.851687],[-0.426095,1.9027],[-0.286235,1.939214],[-0.143795,1.961168],[0,1.9685],[0.143796,1.961168],[0.286235,1.939214],[0.426095,1.9027],[0.562151,1.851687],[0.693181,1.786237],[0.817959,1.706414],[0.935263,1.612278],[1.043869,1.503892],[1.123207,1.380781],[1.195509,1.25375],[1.26065,1.123115],[1.318507,0.989189],[1.368956,0.852287],[1.411872,0.712722],[1.447132,0.570808],[1.474611,0.426861],[1.534583,0.256431],[1.646678,0.121223],[1.798064,0.03212],[1.975908,0],[1.975908,-0.75]]);
  }
